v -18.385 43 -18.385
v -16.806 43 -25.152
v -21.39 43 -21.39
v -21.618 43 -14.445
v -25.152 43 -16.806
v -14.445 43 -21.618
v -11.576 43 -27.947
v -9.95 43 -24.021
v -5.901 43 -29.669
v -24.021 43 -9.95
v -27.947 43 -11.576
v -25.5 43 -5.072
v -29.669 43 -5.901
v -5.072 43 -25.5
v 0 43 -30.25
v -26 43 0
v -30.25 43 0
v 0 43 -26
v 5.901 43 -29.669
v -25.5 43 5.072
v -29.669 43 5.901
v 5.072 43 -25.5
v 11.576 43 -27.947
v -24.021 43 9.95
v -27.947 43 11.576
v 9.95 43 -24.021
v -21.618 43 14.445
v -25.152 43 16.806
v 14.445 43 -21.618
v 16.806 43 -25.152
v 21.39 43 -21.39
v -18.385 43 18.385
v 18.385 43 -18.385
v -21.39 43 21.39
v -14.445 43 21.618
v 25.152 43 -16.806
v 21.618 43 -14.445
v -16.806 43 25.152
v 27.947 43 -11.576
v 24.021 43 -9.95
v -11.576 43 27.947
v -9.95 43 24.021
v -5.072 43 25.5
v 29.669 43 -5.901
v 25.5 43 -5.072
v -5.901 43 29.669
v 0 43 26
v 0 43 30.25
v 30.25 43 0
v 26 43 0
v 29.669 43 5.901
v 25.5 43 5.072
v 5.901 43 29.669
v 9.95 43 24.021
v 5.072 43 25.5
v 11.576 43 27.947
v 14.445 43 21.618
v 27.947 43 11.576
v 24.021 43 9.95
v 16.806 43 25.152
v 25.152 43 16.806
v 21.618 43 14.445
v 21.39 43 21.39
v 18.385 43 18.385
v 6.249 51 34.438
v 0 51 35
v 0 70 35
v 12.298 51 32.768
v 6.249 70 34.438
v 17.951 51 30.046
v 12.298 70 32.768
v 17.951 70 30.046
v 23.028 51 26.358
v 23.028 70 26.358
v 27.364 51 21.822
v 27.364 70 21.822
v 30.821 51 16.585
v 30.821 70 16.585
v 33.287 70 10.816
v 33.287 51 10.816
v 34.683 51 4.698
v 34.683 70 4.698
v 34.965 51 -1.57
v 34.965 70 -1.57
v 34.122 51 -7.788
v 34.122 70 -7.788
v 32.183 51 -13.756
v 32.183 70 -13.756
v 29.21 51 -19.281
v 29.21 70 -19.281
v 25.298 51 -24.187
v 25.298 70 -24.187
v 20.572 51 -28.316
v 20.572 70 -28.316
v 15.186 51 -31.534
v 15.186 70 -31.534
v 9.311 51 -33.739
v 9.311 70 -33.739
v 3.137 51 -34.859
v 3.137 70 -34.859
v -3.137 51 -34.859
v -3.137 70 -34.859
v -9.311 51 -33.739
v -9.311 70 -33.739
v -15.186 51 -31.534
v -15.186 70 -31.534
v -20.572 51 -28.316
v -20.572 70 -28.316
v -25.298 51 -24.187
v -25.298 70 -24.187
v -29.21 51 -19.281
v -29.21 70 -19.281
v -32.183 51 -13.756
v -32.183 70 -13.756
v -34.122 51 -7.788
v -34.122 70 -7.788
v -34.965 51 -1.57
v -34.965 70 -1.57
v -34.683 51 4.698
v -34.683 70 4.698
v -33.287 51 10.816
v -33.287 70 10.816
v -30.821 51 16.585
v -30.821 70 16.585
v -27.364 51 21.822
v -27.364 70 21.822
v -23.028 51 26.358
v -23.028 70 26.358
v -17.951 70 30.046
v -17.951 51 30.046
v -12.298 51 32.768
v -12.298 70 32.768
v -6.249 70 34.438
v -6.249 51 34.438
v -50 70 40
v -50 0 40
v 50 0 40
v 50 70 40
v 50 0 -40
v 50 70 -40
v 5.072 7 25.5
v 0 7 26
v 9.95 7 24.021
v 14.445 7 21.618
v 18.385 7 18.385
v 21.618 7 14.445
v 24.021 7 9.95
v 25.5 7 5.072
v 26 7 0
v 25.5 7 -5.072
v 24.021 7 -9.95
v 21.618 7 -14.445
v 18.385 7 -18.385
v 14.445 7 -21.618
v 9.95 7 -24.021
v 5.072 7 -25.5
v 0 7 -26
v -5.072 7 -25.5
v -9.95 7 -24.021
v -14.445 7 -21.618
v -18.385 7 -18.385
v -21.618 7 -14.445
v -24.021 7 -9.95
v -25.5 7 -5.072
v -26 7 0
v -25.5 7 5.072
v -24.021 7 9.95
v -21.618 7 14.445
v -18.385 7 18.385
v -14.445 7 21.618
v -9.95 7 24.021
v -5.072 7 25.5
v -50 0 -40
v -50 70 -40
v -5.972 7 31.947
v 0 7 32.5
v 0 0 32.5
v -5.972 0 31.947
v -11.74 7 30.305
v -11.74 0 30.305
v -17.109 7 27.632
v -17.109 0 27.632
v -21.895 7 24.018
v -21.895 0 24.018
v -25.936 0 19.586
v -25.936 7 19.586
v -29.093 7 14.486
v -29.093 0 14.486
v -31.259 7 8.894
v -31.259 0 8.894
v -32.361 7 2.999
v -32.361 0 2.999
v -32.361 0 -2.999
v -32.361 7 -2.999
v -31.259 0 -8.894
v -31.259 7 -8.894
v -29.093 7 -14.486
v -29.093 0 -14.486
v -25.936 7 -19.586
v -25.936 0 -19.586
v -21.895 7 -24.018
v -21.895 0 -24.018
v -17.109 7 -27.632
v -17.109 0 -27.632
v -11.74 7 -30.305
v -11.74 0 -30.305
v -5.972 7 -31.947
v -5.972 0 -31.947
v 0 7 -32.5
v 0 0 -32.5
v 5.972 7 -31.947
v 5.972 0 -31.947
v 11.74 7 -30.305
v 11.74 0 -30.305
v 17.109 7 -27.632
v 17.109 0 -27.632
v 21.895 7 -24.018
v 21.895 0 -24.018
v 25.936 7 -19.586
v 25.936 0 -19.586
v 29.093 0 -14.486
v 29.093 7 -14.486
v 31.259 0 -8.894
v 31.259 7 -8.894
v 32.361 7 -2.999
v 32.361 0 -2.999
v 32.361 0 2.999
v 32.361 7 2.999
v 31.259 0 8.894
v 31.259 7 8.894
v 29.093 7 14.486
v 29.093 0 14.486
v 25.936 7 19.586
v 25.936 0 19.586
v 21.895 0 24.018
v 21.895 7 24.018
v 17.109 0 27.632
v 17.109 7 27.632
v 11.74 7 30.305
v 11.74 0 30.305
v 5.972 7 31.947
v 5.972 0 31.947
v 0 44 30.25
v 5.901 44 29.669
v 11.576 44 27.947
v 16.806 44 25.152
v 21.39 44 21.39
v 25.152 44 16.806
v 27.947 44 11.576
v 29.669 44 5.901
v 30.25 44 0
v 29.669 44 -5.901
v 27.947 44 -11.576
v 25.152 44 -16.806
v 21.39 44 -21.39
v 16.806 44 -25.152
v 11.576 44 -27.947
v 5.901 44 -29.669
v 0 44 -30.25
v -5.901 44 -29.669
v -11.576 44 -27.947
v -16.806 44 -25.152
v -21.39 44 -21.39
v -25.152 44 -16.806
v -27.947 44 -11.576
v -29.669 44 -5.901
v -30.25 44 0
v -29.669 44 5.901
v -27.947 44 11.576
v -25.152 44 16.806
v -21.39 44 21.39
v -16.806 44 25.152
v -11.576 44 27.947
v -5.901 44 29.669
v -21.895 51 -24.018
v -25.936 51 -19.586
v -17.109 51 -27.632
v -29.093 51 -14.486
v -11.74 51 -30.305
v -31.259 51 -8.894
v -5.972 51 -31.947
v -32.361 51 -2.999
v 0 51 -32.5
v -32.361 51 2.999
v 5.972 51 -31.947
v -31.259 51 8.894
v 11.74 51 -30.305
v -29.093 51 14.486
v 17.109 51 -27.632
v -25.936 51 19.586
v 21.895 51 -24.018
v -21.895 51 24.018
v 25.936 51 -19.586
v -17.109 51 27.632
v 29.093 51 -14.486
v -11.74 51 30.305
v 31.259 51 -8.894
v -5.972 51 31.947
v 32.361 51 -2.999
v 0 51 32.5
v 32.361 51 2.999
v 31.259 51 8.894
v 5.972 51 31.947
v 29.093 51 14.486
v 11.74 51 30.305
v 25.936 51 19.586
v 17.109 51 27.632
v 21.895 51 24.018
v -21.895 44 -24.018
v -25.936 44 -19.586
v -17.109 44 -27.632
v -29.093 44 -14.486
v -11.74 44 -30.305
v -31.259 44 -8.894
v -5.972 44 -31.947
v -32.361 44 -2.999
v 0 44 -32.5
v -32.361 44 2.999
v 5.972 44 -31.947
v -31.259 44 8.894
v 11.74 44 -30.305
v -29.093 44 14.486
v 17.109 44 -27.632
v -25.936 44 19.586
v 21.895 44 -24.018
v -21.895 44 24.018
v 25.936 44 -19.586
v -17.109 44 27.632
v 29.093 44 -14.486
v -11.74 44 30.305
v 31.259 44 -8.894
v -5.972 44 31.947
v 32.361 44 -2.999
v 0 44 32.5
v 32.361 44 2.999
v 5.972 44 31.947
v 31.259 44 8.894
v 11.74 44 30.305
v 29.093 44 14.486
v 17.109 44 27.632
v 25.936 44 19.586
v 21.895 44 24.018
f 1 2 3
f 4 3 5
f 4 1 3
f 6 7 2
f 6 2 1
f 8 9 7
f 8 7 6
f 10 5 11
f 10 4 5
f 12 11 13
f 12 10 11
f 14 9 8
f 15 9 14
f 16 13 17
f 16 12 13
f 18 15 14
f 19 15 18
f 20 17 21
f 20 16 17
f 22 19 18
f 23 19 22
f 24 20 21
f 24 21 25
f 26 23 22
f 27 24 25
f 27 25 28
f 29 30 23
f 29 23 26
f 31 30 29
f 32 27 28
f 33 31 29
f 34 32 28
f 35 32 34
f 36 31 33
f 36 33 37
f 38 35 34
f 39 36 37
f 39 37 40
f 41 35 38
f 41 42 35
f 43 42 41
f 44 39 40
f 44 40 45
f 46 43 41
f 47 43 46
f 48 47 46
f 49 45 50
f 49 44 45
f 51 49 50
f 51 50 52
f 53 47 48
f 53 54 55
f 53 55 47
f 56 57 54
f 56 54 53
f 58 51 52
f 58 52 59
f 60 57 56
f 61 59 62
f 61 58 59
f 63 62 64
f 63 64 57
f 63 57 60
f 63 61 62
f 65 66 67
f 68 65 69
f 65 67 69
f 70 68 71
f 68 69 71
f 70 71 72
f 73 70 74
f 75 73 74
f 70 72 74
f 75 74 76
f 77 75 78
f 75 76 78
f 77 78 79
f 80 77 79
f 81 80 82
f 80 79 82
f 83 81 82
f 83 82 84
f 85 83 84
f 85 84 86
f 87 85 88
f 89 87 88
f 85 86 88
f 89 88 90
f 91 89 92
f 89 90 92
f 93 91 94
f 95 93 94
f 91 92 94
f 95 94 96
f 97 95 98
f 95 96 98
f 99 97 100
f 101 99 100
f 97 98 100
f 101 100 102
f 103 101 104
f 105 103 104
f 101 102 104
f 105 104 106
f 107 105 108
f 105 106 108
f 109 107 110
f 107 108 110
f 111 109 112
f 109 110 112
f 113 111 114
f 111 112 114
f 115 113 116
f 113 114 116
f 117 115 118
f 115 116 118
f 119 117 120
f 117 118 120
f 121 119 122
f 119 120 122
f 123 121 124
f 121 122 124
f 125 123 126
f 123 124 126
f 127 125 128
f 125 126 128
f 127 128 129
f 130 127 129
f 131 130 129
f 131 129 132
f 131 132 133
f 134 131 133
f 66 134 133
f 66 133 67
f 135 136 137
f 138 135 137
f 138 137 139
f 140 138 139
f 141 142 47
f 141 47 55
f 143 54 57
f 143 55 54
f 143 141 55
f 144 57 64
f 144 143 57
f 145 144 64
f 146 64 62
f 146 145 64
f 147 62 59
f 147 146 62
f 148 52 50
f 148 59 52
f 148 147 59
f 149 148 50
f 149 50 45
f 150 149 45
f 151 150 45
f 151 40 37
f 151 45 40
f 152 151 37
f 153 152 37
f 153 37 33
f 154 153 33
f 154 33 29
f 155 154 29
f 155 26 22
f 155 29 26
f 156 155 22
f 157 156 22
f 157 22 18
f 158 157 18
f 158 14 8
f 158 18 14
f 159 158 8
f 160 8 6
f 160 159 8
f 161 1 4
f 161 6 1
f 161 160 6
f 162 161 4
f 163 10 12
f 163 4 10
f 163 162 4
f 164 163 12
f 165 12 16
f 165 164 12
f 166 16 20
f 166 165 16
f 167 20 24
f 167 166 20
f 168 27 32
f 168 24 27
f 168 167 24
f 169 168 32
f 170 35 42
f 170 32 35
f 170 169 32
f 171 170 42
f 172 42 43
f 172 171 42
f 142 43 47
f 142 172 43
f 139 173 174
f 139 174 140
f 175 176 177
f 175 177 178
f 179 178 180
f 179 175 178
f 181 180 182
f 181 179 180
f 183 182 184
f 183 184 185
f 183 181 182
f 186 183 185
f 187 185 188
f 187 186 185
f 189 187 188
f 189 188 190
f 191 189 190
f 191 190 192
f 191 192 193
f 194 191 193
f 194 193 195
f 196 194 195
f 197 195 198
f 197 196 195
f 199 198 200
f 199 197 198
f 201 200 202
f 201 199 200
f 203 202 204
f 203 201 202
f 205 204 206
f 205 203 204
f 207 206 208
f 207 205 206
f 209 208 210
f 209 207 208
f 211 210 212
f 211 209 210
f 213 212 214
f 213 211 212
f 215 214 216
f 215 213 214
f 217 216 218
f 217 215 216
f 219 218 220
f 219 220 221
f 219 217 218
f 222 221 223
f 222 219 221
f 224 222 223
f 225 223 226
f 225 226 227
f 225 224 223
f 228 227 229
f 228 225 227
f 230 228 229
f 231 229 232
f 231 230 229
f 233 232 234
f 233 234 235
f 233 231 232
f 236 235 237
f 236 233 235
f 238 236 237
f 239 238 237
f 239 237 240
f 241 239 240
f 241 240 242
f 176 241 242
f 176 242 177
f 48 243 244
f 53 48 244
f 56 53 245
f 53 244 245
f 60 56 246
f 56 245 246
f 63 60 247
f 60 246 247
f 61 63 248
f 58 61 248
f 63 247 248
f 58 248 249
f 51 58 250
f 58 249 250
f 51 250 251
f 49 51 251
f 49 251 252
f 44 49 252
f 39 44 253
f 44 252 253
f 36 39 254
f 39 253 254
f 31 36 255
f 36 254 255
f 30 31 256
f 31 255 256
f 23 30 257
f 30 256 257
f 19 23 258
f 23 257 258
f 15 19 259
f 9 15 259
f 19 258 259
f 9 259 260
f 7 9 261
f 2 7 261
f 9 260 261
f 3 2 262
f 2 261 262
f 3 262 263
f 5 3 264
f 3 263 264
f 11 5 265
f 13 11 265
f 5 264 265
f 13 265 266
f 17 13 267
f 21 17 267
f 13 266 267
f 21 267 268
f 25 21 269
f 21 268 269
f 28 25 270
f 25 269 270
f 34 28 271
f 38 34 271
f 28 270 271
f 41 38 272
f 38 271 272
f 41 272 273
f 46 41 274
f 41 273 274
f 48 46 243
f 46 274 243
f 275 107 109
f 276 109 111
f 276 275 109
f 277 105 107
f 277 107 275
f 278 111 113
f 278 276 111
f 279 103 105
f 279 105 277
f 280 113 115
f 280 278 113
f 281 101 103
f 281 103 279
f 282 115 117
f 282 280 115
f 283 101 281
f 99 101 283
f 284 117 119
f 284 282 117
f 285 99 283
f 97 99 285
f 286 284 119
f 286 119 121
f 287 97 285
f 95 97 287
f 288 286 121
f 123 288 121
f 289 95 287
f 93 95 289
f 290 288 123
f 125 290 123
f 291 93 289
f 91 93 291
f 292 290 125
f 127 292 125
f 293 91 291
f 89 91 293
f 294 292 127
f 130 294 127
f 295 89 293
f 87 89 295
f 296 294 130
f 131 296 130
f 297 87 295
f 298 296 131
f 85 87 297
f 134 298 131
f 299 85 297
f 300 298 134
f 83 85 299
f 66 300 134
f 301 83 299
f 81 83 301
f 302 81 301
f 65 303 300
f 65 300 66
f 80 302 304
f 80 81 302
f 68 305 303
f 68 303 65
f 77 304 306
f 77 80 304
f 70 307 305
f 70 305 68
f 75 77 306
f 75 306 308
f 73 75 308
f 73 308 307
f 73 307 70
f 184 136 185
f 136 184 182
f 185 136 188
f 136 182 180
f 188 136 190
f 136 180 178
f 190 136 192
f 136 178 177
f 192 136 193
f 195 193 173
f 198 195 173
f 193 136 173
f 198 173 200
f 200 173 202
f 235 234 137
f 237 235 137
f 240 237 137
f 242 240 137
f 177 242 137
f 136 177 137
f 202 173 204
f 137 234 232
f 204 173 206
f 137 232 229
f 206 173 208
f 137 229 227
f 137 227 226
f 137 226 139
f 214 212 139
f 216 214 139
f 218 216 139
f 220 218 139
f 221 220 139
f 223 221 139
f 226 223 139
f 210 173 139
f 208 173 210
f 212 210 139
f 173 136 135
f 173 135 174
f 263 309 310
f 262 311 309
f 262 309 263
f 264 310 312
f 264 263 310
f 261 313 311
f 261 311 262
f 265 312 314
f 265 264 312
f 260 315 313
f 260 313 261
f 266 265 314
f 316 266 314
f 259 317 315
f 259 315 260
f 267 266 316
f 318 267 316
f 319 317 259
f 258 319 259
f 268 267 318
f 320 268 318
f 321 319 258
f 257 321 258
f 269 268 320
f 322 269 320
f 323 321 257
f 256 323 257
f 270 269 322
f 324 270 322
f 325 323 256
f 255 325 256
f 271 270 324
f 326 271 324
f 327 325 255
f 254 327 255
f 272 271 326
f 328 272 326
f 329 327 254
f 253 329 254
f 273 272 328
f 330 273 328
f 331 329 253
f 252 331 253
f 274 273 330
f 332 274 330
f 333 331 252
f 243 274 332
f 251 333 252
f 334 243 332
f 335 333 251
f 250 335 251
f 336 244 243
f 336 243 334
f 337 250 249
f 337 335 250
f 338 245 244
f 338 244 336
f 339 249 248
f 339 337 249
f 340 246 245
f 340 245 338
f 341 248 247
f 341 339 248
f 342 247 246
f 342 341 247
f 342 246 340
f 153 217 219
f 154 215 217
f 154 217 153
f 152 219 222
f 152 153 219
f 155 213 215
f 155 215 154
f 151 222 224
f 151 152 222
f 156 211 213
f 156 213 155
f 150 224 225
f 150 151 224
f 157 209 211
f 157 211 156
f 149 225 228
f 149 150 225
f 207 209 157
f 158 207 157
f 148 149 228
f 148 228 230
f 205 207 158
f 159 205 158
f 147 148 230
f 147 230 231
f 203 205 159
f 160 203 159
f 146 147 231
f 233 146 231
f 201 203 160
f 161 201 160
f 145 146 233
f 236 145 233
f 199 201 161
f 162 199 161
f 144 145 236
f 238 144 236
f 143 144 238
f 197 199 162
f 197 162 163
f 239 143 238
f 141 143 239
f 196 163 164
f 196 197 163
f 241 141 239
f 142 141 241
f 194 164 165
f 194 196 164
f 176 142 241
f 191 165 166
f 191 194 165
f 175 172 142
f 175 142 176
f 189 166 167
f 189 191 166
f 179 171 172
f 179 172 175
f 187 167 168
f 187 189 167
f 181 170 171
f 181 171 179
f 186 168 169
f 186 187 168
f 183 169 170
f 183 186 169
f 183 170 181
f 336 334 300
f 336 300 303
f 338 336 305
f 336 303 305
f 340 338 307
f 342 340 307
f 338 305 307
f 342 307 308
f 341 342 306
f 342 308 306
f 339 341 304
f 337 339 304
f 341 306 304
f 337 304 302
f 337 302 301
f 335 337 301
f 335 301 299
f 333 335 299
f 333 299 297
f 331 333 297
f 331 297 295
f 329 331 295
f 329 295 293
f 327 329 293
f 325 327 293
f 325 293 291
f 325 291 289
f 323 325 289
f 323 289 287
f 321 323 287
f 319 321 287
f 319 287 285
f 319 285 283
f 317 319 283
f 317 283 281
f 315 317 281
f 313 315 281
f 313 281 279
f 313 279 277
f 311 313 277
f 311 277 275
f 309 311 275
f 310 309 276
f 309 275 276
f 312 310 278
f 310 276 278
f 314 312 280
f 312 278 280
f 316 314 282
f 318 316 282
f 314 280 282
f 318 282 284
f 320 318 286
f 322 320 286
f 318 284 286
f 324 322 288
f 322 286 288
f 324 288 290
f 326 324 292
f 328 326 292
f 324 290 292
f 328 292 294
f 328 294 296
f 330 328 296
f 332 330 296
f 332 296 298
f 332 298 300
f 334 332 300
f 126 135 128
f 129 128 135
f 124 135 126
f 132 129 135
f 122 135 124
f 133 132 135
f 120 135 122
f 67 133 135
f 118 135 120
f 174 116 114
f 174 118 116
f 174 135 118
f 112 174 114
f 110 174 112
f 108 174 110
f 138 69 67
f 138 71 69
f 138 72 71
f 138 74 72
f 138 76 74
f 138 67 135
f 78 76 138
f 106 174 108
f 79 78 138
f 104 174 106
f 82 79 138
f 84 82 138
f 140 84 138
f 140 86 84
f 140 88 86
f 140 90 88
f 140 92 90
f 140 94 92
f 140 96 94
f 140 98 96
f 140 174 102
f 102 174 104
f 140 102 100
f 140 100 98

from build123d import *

# Parameters (mm, degrees)
SKETCH1_W           = 100
SKETCH1_H           = 80
SKETCH1_R           = 26
BOSS_EXTRUDE1_DEPTH = 70
SKETCH2_R           = 32.5
CUT_EXTRUDE1_DEPTH  = 27
BOSS_EXTRUDE2_START = 1
SKETCH4_R           = 32.5
SKETCH4_R_2         = 30.25
BOSS_EXTRUDE2_DEPTH = 1
SKETCH5_R           = 35
CUT_EXTRUDE2_DEPTH  = 19
CUT_EXTRUDE3_START  = -7
SKETCH6_R           = 32.5
CUT_EXTRUDE3_DEPTH  = 7


with BuildPart() as part:
    # Sketch1 → Boss-Extrude1 (new body)
    with BuildSketch(Plane(origin=(0, 0, 0), x_dir=(1, 0, 0), z_dir=(0, 1, 0))):
        Rectangle(SKETCH1_W, SKETCH1_H)
        with Locations(Location((0, 0, 0), (0, 0, 270))):
            Circle(SKETCH1_R, mode=Mode.SUBTRACT)
    extrude(amount=BOSS_EXTRUDE1_DEPTH)

    # Sketch2 → Cut-Extrude1 (cut)
    with BuildSketch(Plane(origin=(0, 70, 0), x_dir=(1, 0, 0), z_dir=(0, 1, 0))):
        with Locations(Location((0, 0, 0), (0, 0, 270))):
            Circle(SKETCH2_R)
    extrude(amount=-CUT_EXTRUDE1_DEPTH, mode=Mode.SUBTRACT)

    # Sketch4 → Boss-Extrude2 (add)
    with BuildSketch(Plane(origin=(0, 43, 0), x_dir=(1, 0, 0), z_dir=(0, 1, 0)).offset(BOSS_EXTRUDE2_START)):
        with Locations(Location((0, 0, 0), (0, 0, 270))):
            Circle(SKETCH4_R)
        with Locations(Location((0, 0, 0), (0, 0, 270))):
            Circle(SKETCH4_R_2, mode=Mode.SUBTRACT)
    extrude(amount=-BOSS_EXTRUDE2_DEPTH)

    # Sketch5 → Cut-Extrude2 (cut)
    with BuildSketch(Plane(origin=(0, 70, 0), x_dir=(1, 0, 0), z_dir=(0, 1, 0))):
        with Locations(Location((0, 0, 0), (0, 0, 270))):
            Circle(SKETCH5_R)
    extrude(amount=-CUT_EXTRUDE2_DEPTH, mode=Mode.SUBTRACT)

    # Sketch6 → Cut-Extrude3 (cut)
    with BuildSketch(Plane.XZ.offset(CUT_EXTRUDE3_START)):
        with Locations(Location((0, 0, 0), (0, 0, 90))):
            Circle(SKETCH6_R)
    extrude(amount=CUT_EXTRUDE3_DEPTH, mode=Mode.SUBTRACT)


solid = part.part
